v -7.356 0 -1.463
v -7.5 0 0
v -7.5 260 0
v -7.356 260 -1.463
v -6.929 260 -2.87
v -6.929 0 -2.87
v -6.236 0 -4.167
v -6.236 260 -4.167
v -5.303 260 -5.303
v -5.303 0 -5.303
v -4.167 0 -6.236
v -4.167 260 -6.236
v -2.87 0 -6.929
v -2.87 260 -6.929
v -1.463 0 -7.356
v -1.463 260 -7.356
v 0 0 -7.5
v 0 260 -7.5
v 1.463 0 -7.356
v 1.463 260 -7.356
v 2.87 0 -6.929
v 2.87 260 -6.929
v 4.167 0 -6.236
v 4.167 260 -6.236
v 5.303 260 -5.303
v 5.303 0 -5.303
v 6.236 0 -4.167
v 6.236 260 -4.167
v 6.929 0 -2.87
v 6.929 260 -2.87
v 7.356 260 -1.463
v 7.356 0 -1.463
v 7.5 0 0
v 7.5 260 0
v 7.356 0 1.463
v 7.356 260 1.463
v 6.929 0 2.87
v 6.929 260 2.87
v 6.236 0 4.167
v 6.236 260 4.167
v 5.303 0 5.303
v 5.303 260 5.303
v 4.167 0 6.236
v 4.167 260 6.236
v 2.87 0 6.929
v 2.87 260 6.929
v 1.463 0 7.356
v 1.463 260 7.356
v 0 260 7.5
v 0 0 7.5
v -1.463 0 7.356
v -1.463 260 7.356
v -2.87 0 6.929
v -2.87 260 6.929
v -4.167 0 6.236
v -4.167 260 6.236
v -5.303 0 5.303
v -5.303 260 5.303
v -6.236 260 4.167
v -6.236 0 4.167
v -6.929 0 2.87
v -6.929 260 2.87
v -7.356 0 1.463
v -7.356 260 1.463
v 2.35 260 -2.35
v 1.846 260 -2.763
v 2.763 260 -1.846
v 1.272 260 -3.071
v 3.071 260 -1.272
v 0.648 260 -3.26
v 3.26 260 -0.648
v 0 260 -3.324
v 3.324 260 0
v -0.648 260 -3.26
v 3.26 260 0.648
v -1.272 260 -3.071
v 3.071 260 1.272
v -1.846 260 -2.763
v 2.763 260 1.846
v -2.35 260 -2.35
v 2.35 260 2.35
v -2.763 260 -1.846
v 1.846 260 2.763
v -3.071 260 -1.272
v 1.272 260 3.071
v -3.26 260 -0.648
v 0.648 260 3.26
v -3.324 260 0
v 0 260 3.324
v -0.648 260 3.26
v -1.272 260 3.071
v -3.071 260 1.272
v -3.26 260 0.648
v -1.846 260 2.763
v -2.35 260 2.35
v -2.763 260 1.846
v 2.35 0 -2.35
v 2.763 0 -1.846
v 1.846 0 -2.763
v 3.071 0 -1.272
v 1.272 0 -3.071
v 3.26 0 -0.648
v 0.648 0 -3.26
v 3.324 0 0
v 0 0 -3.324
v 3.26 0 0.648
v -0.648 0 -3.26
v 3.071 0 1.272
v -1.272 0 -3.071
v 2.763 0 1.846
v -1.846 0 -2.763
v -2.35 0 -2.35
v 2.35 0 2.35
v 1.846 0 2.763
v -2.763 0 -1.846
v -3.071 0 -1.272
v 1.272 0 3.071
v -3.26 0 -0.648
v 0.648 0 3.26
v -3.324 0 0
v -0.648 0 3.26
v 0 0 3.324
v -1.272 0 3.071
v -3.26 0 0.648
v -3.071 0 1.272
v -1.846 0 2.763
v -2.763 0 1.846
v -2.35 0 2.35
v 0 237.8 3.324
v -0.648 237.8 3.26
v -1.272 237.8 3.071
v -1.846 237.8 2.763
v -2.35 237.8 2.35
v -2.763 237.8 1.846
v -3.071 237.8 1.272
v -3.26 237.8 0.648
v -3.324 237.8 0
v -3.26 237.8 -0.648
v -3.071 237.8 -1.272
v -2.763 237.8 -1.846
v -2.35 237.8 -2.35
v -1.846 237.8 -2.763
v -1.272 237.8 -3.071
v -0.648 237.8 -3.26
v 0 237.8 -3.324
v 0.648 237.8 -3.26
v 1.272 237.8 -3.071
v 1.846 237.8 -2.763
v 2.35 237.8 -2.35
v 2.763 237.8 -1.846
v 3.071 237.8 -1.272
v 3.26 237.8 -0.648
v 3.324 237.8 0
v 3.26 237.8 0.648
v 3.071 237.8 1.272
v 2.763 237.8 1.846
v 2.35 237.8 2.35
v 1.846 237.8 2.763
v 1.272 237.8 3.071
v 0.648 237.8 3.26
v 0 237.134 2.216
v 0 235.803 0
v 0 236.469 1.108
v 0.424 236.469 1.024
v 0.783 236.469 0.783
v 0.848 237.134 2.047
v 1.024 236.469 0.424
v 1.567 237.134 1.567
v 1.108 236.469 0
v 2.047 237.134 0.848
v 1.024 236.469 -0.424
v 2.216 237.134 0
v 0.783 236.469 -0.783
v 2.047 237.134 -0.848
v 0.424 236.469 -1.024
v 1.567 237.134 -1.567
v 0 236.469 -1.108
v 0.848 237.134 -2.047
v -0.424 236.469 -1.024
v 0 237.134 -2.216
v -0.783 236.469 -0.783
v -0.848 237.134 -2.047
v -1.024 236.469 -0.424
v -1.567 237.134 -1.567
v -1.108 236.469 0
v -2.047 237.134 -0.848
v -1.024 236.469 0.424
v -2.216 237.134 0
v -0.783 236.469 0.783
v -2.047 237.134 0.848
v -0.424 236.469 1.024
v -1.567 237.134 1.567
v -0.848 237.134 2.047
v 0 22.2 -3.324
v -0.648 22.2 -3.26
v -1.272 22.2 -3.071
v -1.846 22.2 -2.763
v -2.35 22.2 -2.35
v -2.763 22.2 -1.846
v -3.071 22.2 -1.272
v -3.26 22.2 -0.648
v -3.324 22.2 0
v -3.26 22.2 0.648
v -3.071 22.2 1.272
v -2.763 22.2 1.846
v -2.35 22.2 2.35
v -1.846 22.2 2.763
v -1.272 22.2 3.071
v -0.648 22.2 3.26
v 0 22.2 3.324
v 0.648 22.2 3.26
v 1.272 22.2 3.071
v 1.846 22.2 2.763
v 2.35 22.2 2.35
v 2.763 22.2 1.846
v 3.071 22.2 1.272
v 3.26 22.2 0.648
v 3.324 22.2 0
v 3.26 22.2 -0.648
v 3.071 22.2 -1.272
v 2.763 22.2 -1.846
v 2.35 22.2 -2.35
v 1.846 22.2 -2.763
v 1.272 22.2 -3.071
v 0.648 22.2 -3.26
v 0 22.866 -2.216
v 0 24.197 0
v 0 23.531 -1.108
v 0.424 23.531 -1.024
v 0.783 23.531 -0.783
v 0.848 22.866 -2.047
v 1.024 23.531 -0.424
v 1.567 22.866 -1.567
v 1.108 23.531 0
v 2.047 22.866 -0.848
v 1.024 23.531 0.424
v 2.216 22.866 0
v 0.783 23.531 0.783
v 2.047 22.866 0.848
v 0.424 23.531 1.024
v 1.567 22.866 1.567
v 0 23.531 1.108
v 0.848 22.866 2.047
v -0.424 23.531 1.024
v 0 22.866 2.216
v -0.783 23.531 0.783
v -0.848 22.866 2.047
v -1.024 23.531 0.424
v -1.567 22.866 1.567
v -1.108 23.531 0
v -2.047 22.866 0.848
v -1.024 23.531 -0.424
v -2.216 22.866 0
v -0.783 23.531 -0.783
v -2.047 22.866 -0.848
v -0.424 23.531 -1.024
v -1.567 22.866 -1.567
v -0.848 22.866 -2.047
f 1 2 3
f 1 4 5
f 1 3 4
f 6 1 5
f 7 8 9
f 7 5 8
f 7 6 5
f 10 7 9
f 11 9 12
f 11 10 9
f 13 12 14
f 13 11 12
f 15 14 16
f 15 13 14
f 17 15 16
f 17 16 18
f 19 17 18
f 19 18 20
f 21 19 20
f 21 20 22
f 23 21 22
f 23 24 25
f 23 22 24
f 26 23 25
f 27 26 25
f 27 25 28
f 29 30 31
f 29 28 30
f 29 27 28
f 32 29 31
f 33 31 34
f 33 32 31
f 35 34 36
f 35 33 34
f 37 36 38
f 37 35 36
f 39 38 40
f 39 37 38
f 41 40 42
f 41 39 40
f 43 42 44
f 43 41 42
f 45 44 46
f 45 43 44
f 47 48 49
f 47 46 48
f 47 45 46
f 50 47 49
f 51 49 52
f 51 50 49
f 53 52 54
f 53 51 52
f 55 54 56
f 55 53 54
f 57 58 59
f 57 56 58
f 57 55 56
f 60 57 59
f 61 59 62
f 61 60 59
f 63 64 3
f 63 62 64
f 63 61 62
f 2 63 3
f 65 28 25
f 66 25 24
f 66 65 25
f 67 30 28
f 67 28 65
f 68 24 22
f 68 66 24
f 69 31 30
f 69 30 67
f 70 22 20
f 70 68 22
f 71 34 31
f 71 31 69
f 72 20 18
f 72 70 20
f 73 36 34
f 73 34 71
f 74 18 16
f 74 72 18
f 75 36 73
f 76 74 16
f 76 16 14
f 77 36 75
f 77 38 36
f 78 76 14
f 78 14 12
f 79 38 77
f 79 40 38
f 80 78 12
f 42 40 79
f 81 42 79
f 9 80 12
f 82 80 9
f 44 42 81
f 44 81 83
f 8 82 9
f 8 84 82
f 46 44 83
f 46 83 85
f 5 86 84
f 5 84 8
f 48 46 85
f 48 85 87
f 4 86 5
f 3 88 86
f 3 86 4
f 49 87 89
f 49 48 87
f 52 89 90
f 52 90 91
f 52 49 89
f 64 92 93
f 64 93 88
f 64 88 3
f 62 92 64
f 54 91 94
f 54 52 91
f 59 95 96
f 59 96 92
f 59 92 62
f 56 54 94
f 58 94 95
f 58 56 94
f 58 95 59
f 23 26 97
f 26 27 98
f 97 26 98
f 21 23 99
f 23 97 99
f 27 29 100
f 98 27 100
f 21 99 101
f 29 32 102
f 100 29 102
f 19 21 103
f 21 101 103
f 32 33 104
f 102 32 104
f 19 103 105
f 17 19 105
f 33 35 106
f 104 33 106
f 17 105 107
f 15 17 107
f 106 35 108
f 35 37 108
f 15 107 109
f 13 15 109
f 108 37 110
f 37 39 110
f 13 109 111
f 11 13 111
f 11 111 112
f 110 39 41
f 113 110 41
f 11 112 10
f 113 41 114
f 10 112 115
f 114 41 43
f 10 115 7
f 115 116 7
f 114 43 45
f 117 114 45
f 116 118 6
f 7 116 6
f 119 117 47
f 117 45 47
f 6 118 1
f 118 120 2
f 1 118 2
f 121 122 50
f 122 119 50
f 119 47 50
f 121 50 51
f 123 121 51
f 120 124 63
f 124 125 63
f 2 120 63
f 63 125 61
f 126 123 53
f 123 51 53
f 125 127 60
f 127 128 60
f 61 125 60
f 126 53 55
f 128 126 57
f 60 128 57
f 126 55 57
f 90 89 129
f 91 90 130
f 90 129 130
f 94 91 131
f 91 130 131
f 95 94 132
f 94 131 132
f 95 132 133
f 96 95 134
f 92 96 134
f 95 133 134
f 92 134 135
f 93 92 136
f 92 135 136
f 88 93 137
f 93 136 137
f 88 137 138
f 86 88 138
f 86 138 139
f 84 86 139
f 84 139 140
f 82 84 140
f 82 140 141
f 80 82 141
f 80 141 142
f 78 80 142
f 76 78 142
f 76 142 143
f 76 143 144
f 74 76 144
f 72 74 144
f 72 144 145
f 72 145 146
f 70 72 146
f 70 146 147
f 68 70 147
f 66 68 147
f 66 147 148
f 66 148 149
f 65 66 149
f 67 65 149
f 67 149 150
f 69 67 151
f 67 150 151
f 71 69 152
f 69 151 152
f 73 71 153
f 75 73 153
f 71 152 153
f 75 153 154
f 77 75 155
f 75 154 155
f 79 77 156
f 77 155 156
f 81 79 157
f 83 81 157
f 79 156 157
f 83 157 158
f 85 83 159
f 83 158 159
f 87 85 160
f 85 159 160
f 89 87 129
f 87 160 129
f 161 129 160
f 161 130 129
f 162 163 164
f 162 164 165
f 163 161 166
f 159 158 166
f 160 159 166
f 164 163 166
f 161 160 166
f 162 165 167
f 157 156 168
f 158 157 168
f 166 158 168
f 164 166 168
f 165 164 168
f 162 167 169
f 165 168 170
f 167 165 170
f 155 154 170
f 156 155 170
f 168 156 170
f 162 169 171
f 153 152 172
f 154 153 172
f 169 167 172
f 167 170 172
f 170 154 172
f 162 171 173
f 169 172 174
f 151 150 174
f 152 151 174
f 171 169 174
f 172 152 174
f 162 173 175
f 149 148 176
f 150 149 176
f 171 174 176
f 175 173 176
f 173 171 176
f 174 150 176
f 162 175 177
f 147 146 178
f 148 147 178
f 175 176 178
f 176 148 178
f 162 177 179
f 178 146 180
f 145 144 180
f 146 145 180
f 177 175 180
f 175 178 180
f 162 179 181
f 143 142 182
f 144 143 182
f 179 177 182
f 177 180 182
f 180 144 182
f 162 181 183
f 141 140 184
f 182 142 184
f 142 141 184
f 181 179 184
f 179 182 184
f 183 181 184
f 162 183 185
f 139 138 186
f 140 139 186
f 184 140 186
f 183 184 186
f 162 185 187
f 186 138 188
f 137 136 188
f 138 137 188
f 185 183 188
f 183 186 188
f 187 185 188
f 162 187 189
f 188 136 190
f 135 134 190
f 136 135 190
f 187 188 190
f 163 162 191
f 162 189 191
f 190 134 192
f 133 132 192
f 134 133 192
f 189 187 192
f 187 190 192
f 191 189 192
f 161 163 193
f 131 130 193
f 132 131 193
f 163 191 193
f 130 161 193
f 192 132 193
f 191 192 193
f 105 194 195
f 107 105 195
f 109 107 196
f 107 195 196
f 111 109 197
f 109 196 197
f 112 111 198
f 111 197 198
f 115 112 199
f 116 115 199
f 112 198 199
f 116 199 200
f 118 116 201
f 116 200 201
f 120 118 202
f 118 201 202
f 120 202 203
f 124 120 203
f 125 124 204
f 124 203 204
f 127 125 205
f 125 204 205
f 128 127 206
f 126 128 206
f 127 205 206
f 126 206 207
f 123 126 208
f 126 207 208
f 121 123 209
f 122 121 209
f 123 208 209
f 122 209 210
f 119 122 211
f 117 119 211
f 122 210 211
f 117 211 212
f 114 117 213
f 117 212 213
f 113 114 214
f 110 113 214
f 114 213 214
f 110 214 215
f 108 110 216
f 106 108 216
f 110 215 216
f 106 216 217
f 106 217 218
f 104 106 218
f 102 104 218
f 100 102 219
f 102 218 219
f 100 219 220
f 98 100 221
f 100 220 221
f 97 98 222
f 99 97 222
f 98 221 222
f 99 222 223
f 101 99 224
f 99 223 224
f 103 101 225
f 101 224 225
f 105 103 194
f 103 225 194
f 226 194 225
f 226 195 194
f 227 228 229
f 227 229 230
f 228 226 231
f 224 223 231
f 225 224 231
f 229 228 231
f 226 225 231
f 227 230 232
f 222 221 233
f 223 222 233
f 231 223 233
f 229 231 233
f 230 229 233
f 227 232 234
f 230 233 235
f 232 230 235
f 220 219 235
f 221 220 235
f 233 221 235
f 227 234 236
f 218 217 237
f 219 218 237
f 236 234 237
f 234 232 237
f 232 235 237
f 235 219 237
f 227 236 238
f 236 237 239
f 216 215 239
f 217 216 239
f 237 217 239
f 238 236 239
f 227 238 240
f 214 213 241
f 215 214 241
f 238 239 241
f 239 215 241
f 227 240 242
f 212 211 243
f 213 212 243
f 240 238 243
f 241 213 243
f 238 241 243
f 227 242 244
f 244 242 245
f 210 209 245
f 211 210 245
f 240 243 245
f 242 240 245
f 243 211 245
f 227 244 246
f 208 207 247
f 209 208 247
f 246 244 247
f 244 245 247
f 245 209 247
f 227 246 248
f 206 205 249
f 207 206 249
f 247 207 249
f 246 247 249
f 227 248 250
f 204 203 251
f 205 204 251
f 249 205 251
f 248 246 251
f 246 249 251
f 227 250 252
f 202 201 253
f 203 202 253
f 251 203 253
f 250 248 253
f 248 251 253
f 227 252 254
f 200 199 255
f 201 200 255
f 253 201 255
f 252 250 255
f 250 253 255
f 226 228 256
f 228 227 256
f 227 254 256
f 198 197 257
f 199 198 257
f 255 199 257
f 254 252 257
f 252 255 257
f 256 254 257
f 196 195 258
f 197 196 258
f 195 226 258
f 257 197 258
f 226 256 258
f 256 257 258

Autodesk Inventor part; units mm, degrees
ref_plane "YZ Plane" through (0, 0, 0) normal (1, 0, 0) x (0, 1, 0)
ref_plane "XZ Plane" through (0, 0, 0) normal (0, 1, 0) x (-1, 0, 0)
ref_plane "XY Plane" through (0, 0, 0) normal (0, 0, 1) x (1, 0, 0)
sketch "Sketch1" plane through (0, 0, 0) normal (0, 1, 0) x (-1, 0, 0)
  circle A0 centre (0, 0) radius 7.5
  dimension "d0" = 15
extrude "Extrusion1" add sketch "Sketch1" along normal blind 260
sketch "Sketch2" plane through (0, 260, 0) normal (0, 1, 0) x (1, 0, 0)
  point P0 (0, 0)
  point P1 (0, 0)
hole "Hole1" at (0, 260, 0) direction (0, -1, 0) diameter 6.647 depth 22.2 tip angle 118 thread size "M8x1.25" class "6H" standard "ISO Metric profile"
sketch "Sketch3" plane through (0, 0, 0) normal (0, -1, 0) x (1, 0, 0)
  point P0 (0, 0)
  point P1 (0, 0)
hole "Hole2" at (0, 0, 0) direction (0, 1, 0) diameter 6.647 depth 22.2 tip angle 118 thread size "M8x1.25" class "6H" standard "ISO Metric profile"
properties part number "Structure_bar"
